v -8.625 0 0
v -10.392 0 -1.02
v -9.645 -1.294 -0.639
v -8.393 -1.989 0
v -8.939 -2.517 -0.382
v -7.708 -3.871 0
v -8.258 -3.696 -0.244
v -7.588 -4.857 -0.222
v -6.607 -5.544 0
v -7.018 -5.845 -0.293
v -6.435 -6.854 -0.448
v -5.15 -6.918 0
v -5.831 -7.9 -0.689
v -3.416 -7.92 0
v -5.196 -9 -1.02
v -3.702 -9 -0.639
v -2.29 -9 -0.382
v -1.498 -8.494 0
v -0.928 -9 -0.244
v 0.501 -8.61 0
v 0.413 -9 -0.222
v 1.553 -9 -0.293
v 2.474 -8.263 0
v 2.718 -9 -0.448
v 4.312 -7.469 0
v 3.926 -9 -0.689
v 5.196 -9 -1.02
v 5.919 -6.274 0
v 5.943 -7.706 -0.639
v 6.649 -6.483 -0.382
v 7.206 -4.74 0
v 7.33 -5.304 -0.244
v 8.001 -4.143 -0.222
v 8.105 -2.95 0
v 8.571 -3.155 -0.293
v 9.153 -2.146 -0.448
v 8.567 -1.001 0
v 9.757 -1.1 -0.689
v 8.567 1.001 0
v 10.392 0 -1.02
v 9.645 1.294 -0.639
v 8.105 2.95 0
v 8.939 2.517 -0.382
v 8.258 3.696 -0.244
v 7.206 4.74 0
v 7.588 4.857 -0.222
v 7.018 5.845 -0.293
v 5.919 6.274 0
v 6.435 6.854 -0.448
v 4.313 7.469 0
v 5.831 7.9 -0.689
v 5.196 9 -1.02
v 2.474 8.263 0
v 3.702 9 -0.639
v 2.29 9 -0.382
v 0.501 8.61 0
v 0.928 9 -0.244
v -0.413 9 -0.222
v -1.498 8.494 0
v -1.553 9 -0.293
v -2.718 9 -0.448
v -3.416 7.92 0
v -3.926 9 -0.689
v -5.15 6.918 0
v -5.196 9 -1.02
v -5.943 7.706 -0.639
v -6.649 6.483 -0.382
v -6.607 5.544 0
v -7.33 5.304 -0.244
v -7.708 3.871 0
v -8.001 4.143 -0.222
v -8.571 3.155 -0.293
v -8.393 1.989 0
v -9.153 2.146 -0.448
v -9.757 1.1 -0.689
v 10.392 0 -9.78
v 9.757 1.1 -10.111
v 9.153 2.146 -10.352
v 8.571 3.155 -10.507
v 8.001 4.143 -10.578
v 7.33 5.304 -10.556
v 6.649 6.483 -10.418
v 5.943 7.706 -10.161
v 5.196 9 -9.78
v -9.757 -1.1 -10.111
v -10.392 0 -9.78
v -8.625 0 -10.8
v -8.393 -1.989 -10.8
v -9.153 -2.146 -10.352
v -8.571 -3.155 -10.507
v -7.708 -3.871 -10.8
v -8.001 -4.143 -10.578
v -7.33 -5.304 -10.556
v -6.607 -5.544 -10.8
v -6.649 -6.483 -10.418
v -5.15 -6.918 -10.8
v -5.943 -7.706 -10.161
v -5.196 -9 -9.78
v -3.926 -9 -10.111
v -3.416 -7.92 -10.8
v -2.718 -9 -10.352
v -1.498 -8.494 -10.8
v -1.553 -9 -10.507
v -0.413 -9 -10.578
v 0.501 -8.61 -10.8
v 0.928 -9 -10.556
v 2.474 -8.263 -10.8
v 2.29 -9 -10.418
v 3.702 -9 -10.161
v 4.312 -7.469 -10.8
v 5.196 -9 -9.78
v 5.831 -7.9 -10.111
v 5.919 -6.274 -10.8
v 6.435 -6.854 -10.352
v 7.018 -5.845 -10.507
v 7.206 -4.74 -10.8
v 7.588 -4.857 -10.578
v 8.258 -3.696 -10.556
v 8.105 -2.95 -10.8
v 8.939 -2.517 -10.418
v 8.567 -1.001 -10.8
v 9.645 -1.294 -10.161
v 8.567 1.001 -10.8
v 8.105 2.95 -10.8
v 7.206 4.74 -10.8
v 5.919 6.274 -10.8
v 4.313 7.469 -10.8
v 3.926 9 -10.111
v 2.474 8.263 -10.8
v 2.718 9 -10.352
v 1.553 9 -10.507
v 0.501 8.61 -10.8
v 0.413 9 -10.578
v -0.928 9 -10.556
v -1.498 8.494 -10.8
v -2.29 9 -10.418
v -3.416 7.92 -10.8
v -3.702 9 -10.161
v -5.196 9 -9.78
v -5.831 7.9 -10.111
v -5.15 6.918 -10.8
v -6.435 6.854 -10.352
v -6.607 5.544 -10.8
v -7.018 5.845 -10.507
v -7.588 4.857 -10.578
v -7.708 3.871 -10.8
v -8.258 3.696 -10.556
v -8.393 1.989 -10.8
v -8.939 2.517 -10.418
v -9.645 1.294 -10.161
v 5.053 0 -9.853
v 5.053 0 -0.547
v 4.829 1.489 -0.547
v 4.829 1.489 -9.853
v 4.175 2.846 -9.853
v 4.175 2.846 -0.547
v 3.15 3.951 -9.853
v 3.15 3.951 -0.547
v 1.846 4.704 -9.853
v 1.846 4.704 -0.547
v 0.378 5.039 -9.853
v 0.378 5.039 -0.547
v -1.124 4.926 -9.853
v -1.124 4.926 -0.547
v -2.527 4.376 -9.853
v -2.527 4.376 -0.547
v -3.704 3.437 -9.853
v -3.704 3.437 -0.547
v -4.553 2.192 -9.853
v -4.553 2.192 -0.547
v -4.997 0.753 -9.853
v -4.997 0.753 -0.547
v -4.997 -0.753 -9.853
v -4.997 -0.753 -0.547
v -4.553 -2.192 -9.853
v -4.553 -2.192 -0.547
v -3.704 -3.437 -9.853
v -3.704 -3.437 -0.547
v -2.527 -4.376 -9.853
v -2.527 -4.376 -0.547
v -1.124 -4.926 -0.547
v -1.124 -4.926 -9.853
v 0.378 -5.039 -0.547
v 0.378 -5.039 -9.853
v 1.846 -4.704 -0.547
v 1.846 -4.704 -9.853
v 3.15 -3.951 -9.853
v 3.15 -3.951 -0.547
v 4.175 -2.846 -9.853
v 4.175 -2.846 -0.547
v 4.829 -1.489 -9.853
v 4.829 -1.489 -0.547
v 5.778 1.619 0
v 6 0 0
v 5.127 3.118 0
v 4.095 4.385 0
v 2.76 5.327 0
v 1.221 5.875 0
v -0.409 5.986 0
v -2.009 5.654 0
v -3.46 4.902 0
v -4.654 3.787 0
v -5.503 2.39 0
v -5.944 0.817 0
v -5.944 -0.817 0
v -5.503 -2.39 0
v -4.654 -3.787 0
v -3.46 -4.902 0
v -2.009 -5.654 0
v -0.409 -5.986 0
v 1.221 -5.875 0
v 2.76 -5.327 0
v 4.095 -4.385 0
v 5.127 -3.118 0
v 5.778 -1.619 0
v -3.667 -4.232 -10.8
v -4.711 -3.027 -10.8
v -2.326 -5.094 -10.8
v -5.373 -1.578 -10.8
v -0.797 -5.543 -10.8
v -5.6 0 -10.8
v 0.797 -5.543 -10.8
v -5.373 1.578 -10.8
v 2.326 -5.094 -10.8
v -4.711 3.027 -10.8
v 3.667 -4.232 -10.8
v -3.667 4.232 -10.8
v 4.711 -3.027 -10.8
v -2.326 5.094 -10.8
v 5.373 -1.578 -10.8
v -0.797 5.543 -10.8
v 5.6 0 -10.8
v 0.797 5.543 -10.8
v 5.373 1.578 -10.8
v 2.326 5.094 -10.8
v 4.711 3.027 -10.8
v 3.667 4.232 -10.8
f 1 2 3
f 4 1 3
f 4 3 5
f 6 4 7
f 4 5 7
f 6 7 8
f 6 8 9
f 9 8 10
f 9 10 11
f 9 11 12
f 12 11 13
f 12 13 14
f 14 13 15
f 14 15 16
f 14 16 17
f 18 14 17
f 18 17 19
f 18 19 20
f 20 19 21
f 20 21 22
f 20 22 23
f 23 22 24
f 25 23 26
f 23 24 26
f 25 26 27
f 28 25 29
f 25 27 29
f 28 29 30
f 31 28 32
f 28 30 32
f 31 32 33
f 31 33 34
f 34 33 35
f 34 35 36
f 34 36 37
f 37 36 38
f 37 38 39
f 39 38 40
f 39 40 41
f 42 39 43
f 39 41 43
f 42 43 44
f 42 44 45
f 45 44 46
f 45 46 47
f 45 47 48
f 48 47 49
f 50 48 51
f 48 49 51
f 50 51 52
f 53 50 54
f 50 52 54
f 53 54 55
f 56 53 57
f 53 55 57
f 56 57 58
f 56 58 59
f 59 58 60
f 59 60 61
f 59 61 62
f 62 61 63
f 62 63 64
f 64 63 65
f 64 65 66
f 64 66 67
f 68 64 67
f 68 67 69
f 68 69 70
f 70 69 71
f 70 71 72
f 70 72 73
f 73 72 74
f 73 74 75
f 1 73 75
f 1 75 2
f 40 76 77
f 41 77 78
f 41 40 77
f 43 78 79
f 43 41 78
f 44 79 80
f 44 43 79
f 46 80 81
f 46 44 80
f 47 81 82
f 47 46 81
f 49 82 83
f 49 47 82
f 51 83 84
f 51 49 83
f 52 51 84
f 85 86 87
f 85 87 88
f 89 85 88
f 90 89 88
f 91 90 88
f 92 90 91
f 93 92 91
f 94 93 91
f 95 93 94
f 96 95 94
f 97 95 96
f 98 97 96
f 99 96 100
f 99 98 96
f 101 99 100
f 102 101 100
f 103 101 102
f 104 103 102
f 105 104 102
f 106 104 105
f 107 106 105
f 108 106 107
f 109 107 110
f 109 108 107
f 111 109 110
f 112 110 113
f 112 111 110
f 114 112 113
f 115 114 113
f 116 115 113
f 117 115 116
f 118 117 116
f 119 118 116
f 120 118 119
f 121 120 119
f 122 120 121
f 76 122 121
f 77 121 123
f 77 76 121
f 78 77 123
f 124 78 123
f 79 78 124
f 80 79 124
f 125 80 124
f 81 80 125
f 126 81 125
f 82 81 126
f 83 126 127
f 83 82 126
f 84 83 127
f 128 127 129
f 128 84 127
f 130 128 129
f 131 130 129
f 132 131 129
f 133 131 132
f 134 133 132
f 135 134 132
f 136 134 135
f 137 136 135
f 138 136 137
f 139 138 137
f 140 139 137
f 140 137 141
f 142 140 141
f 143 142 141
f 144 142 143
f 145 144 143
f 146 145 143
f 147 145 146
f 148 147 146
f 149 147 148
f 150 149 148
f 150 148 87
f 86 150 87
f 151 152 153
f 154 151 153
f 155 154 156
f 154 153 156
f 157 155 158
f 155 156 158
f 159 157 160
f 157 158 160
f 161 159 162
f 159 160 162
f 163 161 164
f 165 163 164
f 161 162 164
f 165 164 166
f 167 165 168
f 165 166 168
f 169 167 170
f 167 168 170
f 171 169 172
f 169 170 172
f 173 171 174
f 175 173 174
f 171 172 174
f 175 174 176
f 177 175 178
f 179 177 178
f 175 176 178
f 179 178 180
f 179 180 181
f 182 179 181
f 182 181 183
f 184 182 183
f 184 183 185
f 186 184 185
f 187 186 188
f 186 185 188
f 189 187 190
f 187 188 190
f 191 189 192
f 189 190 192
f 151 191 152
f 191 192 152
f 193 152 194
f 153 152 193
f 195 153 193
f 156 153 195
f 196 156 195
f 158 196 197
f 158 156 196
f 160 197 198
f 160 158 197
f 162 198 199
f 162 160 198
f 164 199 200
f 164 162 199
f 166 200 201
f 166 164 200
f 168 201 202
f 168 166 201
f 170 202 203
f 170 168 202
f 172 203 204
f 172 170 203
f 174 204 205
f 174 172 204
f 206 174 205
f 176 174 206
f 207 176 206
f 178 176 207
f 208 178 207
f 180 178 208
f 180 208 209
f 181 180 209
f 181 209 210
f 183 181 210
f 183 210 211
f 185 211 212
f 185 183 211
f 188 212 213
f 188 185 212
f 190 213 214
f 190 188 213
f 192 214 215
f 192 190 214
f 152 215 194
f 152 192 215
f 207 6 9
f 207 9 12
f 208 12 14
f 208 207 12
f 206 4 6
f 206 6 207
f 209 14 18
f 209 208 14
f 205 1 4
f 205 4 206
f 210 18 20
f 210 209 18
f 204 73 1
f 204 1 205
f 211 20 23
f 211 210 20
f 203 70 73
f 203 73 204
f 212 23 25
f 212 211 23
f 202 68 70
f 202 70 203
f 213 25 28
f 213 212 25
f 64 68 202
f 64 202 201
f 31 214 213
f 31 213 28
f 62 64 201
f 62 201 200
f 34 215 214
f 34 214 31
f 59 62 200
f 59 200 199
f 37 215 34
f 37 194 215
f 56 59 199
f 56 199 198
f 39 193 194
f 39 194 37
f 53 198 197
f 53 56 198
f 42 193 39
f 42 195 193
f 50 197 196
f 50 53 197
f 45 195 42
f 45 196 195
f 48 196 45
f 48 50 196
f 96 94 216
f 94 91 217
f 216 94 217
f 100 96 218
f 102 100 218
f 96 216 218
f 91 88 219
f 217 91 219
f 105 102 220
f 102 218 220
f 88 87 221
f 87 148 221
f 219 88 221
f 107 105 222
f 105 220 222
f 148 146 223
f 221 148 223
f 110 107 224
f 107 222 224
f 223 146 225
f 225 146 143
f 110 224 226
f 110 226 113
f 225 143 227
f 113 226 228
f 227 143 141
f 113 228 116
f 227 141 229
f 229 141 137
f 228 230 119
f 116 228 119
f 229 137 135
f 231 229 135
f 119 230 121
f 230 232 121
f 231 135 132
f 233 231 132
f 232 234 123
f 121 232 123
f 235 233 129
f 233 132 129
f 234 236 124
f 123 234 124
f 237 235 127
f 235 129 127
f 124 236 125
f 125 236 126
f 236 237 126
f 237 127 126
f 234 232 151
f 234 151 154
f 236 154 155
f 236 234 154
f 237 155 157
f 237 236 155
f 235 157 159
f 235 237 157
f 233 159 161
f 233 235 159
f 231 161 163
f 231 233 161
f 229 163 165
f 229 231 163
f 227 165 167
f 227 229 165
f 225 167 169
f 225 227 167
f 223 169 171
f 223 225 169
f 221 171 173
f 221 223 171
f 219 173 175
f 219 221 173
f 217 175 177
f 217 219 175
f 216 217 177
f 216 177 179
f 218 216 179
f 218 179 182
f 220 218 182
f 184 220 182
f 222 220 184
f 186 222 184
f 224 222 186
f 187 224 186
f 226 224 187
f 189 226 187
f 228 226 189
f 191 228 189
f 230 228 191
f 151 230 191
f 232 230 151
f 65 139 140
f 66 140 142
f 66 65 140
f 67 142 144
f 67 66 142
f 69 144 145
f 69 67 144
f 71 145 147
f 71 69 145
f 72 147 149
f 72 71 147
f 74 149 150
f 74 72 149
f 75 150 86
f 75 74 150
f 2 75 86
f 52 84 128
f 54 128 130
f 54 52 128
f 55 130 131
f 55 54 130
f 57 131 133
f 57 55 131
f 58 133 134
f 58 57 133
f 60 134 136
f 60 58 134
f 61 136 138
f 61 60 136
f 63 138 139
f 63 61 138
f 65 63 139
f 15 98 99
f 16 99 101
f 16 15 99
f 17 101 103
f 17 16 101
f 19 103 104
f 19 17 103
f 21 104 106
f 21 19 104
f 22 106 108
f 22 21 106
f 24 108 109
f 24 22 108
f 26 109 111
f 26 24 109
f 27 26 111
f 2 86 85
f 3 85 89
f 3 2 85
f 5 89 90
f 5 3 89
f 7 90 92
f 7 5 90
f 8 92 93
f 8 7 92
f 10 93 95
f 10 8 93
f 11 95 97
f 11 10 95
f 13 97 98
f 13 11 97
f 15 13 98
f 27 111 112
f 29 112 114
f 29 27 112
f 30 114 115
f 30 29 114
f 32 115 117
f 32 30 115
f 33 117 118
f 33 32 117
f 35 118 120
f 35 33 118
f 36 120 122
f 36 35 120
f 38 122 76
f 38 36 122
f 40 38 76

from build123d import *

# Parameters (mm, degrees)
SKETCH1_R               = 5.053
BASENUT_DEPTH           = 10.8
ENDCHAMFER_SIZE         = 0.947
ENDCHAMFER_SIZE2        = 0.546750705
ENDCHAMFER_PART_2_SIZE  = 0.947
ENDCHAMFER_PART_2_SIZE2 = 0.546750705


with BuildPart() as part:
    # Sketch1 → BaseNut (new body)
    with BuildSketch(Plane.XY):
        Polygon((10.392304845, 0), (5.196152423, 9), (-5.196152423, 9), (-10.392304845, 0), (-5.196152423, -9), (5.196152423, -9), align=None)
        Circle(SKETCH1_R, mode=Mode.SUBTRACT)
    extrude(amount=-BASENUT_DEPTH)

    # Sketch2 → Double-Chamfer (revolve, cut)
    with BuildSketch(Plane(origin=(0, 0, 0), x_dir=(1, 0, 0), z_dir=(0, 1, 0))):
        Polygon((-10.392304845, 10.8), (-8.625, 10.8), (-10.392304845, 9.779646072), align=None)
        Polygon((-10.392304845, 1.020353928), (-10.392304845, 0), (-8.625, 0), align=None)
    revolve(axis=Axis((0, 0, -3.375940562), (0, 0, 1)), mode=Mode.SUBTRACT)

    # EndChamfer
    endchamfer_edges = [part.edges().sort_by_distance(p)[0] for p in [
        (-5.053, 0, -10.8),
    ]]
    endchamfer_side = [part.faces().sort_by_distance(p)[0] for p in [
        (-5.053, 0, -5.4),
    ]]
    chamfer(endchamfer_edges, length=ENDCHAMFER_SIZE, length2=ENDCHAMFER_SIZE2, reference=endchamfer_side[0])

    # EndChamfer part 2
    endchamfer_part_2_edges = [part.edges().sort_by_distance(p)[0] for p in [
        (-5.053, 0, 0),
    ]]
    endchamfer_part_2_side = [part.faces().sort_by_distance(p)[0] for p in [
        (8.38104816, 0, 0),
    ]]
    chamfer(endchamfer_part_2_edges, length=ENDCHAMFER_PART_2_SIZE, length2=ENDCHAMFER_PART_2_SIZE2, reference=endchamfer_part_2_side[0])


solid = part.part
